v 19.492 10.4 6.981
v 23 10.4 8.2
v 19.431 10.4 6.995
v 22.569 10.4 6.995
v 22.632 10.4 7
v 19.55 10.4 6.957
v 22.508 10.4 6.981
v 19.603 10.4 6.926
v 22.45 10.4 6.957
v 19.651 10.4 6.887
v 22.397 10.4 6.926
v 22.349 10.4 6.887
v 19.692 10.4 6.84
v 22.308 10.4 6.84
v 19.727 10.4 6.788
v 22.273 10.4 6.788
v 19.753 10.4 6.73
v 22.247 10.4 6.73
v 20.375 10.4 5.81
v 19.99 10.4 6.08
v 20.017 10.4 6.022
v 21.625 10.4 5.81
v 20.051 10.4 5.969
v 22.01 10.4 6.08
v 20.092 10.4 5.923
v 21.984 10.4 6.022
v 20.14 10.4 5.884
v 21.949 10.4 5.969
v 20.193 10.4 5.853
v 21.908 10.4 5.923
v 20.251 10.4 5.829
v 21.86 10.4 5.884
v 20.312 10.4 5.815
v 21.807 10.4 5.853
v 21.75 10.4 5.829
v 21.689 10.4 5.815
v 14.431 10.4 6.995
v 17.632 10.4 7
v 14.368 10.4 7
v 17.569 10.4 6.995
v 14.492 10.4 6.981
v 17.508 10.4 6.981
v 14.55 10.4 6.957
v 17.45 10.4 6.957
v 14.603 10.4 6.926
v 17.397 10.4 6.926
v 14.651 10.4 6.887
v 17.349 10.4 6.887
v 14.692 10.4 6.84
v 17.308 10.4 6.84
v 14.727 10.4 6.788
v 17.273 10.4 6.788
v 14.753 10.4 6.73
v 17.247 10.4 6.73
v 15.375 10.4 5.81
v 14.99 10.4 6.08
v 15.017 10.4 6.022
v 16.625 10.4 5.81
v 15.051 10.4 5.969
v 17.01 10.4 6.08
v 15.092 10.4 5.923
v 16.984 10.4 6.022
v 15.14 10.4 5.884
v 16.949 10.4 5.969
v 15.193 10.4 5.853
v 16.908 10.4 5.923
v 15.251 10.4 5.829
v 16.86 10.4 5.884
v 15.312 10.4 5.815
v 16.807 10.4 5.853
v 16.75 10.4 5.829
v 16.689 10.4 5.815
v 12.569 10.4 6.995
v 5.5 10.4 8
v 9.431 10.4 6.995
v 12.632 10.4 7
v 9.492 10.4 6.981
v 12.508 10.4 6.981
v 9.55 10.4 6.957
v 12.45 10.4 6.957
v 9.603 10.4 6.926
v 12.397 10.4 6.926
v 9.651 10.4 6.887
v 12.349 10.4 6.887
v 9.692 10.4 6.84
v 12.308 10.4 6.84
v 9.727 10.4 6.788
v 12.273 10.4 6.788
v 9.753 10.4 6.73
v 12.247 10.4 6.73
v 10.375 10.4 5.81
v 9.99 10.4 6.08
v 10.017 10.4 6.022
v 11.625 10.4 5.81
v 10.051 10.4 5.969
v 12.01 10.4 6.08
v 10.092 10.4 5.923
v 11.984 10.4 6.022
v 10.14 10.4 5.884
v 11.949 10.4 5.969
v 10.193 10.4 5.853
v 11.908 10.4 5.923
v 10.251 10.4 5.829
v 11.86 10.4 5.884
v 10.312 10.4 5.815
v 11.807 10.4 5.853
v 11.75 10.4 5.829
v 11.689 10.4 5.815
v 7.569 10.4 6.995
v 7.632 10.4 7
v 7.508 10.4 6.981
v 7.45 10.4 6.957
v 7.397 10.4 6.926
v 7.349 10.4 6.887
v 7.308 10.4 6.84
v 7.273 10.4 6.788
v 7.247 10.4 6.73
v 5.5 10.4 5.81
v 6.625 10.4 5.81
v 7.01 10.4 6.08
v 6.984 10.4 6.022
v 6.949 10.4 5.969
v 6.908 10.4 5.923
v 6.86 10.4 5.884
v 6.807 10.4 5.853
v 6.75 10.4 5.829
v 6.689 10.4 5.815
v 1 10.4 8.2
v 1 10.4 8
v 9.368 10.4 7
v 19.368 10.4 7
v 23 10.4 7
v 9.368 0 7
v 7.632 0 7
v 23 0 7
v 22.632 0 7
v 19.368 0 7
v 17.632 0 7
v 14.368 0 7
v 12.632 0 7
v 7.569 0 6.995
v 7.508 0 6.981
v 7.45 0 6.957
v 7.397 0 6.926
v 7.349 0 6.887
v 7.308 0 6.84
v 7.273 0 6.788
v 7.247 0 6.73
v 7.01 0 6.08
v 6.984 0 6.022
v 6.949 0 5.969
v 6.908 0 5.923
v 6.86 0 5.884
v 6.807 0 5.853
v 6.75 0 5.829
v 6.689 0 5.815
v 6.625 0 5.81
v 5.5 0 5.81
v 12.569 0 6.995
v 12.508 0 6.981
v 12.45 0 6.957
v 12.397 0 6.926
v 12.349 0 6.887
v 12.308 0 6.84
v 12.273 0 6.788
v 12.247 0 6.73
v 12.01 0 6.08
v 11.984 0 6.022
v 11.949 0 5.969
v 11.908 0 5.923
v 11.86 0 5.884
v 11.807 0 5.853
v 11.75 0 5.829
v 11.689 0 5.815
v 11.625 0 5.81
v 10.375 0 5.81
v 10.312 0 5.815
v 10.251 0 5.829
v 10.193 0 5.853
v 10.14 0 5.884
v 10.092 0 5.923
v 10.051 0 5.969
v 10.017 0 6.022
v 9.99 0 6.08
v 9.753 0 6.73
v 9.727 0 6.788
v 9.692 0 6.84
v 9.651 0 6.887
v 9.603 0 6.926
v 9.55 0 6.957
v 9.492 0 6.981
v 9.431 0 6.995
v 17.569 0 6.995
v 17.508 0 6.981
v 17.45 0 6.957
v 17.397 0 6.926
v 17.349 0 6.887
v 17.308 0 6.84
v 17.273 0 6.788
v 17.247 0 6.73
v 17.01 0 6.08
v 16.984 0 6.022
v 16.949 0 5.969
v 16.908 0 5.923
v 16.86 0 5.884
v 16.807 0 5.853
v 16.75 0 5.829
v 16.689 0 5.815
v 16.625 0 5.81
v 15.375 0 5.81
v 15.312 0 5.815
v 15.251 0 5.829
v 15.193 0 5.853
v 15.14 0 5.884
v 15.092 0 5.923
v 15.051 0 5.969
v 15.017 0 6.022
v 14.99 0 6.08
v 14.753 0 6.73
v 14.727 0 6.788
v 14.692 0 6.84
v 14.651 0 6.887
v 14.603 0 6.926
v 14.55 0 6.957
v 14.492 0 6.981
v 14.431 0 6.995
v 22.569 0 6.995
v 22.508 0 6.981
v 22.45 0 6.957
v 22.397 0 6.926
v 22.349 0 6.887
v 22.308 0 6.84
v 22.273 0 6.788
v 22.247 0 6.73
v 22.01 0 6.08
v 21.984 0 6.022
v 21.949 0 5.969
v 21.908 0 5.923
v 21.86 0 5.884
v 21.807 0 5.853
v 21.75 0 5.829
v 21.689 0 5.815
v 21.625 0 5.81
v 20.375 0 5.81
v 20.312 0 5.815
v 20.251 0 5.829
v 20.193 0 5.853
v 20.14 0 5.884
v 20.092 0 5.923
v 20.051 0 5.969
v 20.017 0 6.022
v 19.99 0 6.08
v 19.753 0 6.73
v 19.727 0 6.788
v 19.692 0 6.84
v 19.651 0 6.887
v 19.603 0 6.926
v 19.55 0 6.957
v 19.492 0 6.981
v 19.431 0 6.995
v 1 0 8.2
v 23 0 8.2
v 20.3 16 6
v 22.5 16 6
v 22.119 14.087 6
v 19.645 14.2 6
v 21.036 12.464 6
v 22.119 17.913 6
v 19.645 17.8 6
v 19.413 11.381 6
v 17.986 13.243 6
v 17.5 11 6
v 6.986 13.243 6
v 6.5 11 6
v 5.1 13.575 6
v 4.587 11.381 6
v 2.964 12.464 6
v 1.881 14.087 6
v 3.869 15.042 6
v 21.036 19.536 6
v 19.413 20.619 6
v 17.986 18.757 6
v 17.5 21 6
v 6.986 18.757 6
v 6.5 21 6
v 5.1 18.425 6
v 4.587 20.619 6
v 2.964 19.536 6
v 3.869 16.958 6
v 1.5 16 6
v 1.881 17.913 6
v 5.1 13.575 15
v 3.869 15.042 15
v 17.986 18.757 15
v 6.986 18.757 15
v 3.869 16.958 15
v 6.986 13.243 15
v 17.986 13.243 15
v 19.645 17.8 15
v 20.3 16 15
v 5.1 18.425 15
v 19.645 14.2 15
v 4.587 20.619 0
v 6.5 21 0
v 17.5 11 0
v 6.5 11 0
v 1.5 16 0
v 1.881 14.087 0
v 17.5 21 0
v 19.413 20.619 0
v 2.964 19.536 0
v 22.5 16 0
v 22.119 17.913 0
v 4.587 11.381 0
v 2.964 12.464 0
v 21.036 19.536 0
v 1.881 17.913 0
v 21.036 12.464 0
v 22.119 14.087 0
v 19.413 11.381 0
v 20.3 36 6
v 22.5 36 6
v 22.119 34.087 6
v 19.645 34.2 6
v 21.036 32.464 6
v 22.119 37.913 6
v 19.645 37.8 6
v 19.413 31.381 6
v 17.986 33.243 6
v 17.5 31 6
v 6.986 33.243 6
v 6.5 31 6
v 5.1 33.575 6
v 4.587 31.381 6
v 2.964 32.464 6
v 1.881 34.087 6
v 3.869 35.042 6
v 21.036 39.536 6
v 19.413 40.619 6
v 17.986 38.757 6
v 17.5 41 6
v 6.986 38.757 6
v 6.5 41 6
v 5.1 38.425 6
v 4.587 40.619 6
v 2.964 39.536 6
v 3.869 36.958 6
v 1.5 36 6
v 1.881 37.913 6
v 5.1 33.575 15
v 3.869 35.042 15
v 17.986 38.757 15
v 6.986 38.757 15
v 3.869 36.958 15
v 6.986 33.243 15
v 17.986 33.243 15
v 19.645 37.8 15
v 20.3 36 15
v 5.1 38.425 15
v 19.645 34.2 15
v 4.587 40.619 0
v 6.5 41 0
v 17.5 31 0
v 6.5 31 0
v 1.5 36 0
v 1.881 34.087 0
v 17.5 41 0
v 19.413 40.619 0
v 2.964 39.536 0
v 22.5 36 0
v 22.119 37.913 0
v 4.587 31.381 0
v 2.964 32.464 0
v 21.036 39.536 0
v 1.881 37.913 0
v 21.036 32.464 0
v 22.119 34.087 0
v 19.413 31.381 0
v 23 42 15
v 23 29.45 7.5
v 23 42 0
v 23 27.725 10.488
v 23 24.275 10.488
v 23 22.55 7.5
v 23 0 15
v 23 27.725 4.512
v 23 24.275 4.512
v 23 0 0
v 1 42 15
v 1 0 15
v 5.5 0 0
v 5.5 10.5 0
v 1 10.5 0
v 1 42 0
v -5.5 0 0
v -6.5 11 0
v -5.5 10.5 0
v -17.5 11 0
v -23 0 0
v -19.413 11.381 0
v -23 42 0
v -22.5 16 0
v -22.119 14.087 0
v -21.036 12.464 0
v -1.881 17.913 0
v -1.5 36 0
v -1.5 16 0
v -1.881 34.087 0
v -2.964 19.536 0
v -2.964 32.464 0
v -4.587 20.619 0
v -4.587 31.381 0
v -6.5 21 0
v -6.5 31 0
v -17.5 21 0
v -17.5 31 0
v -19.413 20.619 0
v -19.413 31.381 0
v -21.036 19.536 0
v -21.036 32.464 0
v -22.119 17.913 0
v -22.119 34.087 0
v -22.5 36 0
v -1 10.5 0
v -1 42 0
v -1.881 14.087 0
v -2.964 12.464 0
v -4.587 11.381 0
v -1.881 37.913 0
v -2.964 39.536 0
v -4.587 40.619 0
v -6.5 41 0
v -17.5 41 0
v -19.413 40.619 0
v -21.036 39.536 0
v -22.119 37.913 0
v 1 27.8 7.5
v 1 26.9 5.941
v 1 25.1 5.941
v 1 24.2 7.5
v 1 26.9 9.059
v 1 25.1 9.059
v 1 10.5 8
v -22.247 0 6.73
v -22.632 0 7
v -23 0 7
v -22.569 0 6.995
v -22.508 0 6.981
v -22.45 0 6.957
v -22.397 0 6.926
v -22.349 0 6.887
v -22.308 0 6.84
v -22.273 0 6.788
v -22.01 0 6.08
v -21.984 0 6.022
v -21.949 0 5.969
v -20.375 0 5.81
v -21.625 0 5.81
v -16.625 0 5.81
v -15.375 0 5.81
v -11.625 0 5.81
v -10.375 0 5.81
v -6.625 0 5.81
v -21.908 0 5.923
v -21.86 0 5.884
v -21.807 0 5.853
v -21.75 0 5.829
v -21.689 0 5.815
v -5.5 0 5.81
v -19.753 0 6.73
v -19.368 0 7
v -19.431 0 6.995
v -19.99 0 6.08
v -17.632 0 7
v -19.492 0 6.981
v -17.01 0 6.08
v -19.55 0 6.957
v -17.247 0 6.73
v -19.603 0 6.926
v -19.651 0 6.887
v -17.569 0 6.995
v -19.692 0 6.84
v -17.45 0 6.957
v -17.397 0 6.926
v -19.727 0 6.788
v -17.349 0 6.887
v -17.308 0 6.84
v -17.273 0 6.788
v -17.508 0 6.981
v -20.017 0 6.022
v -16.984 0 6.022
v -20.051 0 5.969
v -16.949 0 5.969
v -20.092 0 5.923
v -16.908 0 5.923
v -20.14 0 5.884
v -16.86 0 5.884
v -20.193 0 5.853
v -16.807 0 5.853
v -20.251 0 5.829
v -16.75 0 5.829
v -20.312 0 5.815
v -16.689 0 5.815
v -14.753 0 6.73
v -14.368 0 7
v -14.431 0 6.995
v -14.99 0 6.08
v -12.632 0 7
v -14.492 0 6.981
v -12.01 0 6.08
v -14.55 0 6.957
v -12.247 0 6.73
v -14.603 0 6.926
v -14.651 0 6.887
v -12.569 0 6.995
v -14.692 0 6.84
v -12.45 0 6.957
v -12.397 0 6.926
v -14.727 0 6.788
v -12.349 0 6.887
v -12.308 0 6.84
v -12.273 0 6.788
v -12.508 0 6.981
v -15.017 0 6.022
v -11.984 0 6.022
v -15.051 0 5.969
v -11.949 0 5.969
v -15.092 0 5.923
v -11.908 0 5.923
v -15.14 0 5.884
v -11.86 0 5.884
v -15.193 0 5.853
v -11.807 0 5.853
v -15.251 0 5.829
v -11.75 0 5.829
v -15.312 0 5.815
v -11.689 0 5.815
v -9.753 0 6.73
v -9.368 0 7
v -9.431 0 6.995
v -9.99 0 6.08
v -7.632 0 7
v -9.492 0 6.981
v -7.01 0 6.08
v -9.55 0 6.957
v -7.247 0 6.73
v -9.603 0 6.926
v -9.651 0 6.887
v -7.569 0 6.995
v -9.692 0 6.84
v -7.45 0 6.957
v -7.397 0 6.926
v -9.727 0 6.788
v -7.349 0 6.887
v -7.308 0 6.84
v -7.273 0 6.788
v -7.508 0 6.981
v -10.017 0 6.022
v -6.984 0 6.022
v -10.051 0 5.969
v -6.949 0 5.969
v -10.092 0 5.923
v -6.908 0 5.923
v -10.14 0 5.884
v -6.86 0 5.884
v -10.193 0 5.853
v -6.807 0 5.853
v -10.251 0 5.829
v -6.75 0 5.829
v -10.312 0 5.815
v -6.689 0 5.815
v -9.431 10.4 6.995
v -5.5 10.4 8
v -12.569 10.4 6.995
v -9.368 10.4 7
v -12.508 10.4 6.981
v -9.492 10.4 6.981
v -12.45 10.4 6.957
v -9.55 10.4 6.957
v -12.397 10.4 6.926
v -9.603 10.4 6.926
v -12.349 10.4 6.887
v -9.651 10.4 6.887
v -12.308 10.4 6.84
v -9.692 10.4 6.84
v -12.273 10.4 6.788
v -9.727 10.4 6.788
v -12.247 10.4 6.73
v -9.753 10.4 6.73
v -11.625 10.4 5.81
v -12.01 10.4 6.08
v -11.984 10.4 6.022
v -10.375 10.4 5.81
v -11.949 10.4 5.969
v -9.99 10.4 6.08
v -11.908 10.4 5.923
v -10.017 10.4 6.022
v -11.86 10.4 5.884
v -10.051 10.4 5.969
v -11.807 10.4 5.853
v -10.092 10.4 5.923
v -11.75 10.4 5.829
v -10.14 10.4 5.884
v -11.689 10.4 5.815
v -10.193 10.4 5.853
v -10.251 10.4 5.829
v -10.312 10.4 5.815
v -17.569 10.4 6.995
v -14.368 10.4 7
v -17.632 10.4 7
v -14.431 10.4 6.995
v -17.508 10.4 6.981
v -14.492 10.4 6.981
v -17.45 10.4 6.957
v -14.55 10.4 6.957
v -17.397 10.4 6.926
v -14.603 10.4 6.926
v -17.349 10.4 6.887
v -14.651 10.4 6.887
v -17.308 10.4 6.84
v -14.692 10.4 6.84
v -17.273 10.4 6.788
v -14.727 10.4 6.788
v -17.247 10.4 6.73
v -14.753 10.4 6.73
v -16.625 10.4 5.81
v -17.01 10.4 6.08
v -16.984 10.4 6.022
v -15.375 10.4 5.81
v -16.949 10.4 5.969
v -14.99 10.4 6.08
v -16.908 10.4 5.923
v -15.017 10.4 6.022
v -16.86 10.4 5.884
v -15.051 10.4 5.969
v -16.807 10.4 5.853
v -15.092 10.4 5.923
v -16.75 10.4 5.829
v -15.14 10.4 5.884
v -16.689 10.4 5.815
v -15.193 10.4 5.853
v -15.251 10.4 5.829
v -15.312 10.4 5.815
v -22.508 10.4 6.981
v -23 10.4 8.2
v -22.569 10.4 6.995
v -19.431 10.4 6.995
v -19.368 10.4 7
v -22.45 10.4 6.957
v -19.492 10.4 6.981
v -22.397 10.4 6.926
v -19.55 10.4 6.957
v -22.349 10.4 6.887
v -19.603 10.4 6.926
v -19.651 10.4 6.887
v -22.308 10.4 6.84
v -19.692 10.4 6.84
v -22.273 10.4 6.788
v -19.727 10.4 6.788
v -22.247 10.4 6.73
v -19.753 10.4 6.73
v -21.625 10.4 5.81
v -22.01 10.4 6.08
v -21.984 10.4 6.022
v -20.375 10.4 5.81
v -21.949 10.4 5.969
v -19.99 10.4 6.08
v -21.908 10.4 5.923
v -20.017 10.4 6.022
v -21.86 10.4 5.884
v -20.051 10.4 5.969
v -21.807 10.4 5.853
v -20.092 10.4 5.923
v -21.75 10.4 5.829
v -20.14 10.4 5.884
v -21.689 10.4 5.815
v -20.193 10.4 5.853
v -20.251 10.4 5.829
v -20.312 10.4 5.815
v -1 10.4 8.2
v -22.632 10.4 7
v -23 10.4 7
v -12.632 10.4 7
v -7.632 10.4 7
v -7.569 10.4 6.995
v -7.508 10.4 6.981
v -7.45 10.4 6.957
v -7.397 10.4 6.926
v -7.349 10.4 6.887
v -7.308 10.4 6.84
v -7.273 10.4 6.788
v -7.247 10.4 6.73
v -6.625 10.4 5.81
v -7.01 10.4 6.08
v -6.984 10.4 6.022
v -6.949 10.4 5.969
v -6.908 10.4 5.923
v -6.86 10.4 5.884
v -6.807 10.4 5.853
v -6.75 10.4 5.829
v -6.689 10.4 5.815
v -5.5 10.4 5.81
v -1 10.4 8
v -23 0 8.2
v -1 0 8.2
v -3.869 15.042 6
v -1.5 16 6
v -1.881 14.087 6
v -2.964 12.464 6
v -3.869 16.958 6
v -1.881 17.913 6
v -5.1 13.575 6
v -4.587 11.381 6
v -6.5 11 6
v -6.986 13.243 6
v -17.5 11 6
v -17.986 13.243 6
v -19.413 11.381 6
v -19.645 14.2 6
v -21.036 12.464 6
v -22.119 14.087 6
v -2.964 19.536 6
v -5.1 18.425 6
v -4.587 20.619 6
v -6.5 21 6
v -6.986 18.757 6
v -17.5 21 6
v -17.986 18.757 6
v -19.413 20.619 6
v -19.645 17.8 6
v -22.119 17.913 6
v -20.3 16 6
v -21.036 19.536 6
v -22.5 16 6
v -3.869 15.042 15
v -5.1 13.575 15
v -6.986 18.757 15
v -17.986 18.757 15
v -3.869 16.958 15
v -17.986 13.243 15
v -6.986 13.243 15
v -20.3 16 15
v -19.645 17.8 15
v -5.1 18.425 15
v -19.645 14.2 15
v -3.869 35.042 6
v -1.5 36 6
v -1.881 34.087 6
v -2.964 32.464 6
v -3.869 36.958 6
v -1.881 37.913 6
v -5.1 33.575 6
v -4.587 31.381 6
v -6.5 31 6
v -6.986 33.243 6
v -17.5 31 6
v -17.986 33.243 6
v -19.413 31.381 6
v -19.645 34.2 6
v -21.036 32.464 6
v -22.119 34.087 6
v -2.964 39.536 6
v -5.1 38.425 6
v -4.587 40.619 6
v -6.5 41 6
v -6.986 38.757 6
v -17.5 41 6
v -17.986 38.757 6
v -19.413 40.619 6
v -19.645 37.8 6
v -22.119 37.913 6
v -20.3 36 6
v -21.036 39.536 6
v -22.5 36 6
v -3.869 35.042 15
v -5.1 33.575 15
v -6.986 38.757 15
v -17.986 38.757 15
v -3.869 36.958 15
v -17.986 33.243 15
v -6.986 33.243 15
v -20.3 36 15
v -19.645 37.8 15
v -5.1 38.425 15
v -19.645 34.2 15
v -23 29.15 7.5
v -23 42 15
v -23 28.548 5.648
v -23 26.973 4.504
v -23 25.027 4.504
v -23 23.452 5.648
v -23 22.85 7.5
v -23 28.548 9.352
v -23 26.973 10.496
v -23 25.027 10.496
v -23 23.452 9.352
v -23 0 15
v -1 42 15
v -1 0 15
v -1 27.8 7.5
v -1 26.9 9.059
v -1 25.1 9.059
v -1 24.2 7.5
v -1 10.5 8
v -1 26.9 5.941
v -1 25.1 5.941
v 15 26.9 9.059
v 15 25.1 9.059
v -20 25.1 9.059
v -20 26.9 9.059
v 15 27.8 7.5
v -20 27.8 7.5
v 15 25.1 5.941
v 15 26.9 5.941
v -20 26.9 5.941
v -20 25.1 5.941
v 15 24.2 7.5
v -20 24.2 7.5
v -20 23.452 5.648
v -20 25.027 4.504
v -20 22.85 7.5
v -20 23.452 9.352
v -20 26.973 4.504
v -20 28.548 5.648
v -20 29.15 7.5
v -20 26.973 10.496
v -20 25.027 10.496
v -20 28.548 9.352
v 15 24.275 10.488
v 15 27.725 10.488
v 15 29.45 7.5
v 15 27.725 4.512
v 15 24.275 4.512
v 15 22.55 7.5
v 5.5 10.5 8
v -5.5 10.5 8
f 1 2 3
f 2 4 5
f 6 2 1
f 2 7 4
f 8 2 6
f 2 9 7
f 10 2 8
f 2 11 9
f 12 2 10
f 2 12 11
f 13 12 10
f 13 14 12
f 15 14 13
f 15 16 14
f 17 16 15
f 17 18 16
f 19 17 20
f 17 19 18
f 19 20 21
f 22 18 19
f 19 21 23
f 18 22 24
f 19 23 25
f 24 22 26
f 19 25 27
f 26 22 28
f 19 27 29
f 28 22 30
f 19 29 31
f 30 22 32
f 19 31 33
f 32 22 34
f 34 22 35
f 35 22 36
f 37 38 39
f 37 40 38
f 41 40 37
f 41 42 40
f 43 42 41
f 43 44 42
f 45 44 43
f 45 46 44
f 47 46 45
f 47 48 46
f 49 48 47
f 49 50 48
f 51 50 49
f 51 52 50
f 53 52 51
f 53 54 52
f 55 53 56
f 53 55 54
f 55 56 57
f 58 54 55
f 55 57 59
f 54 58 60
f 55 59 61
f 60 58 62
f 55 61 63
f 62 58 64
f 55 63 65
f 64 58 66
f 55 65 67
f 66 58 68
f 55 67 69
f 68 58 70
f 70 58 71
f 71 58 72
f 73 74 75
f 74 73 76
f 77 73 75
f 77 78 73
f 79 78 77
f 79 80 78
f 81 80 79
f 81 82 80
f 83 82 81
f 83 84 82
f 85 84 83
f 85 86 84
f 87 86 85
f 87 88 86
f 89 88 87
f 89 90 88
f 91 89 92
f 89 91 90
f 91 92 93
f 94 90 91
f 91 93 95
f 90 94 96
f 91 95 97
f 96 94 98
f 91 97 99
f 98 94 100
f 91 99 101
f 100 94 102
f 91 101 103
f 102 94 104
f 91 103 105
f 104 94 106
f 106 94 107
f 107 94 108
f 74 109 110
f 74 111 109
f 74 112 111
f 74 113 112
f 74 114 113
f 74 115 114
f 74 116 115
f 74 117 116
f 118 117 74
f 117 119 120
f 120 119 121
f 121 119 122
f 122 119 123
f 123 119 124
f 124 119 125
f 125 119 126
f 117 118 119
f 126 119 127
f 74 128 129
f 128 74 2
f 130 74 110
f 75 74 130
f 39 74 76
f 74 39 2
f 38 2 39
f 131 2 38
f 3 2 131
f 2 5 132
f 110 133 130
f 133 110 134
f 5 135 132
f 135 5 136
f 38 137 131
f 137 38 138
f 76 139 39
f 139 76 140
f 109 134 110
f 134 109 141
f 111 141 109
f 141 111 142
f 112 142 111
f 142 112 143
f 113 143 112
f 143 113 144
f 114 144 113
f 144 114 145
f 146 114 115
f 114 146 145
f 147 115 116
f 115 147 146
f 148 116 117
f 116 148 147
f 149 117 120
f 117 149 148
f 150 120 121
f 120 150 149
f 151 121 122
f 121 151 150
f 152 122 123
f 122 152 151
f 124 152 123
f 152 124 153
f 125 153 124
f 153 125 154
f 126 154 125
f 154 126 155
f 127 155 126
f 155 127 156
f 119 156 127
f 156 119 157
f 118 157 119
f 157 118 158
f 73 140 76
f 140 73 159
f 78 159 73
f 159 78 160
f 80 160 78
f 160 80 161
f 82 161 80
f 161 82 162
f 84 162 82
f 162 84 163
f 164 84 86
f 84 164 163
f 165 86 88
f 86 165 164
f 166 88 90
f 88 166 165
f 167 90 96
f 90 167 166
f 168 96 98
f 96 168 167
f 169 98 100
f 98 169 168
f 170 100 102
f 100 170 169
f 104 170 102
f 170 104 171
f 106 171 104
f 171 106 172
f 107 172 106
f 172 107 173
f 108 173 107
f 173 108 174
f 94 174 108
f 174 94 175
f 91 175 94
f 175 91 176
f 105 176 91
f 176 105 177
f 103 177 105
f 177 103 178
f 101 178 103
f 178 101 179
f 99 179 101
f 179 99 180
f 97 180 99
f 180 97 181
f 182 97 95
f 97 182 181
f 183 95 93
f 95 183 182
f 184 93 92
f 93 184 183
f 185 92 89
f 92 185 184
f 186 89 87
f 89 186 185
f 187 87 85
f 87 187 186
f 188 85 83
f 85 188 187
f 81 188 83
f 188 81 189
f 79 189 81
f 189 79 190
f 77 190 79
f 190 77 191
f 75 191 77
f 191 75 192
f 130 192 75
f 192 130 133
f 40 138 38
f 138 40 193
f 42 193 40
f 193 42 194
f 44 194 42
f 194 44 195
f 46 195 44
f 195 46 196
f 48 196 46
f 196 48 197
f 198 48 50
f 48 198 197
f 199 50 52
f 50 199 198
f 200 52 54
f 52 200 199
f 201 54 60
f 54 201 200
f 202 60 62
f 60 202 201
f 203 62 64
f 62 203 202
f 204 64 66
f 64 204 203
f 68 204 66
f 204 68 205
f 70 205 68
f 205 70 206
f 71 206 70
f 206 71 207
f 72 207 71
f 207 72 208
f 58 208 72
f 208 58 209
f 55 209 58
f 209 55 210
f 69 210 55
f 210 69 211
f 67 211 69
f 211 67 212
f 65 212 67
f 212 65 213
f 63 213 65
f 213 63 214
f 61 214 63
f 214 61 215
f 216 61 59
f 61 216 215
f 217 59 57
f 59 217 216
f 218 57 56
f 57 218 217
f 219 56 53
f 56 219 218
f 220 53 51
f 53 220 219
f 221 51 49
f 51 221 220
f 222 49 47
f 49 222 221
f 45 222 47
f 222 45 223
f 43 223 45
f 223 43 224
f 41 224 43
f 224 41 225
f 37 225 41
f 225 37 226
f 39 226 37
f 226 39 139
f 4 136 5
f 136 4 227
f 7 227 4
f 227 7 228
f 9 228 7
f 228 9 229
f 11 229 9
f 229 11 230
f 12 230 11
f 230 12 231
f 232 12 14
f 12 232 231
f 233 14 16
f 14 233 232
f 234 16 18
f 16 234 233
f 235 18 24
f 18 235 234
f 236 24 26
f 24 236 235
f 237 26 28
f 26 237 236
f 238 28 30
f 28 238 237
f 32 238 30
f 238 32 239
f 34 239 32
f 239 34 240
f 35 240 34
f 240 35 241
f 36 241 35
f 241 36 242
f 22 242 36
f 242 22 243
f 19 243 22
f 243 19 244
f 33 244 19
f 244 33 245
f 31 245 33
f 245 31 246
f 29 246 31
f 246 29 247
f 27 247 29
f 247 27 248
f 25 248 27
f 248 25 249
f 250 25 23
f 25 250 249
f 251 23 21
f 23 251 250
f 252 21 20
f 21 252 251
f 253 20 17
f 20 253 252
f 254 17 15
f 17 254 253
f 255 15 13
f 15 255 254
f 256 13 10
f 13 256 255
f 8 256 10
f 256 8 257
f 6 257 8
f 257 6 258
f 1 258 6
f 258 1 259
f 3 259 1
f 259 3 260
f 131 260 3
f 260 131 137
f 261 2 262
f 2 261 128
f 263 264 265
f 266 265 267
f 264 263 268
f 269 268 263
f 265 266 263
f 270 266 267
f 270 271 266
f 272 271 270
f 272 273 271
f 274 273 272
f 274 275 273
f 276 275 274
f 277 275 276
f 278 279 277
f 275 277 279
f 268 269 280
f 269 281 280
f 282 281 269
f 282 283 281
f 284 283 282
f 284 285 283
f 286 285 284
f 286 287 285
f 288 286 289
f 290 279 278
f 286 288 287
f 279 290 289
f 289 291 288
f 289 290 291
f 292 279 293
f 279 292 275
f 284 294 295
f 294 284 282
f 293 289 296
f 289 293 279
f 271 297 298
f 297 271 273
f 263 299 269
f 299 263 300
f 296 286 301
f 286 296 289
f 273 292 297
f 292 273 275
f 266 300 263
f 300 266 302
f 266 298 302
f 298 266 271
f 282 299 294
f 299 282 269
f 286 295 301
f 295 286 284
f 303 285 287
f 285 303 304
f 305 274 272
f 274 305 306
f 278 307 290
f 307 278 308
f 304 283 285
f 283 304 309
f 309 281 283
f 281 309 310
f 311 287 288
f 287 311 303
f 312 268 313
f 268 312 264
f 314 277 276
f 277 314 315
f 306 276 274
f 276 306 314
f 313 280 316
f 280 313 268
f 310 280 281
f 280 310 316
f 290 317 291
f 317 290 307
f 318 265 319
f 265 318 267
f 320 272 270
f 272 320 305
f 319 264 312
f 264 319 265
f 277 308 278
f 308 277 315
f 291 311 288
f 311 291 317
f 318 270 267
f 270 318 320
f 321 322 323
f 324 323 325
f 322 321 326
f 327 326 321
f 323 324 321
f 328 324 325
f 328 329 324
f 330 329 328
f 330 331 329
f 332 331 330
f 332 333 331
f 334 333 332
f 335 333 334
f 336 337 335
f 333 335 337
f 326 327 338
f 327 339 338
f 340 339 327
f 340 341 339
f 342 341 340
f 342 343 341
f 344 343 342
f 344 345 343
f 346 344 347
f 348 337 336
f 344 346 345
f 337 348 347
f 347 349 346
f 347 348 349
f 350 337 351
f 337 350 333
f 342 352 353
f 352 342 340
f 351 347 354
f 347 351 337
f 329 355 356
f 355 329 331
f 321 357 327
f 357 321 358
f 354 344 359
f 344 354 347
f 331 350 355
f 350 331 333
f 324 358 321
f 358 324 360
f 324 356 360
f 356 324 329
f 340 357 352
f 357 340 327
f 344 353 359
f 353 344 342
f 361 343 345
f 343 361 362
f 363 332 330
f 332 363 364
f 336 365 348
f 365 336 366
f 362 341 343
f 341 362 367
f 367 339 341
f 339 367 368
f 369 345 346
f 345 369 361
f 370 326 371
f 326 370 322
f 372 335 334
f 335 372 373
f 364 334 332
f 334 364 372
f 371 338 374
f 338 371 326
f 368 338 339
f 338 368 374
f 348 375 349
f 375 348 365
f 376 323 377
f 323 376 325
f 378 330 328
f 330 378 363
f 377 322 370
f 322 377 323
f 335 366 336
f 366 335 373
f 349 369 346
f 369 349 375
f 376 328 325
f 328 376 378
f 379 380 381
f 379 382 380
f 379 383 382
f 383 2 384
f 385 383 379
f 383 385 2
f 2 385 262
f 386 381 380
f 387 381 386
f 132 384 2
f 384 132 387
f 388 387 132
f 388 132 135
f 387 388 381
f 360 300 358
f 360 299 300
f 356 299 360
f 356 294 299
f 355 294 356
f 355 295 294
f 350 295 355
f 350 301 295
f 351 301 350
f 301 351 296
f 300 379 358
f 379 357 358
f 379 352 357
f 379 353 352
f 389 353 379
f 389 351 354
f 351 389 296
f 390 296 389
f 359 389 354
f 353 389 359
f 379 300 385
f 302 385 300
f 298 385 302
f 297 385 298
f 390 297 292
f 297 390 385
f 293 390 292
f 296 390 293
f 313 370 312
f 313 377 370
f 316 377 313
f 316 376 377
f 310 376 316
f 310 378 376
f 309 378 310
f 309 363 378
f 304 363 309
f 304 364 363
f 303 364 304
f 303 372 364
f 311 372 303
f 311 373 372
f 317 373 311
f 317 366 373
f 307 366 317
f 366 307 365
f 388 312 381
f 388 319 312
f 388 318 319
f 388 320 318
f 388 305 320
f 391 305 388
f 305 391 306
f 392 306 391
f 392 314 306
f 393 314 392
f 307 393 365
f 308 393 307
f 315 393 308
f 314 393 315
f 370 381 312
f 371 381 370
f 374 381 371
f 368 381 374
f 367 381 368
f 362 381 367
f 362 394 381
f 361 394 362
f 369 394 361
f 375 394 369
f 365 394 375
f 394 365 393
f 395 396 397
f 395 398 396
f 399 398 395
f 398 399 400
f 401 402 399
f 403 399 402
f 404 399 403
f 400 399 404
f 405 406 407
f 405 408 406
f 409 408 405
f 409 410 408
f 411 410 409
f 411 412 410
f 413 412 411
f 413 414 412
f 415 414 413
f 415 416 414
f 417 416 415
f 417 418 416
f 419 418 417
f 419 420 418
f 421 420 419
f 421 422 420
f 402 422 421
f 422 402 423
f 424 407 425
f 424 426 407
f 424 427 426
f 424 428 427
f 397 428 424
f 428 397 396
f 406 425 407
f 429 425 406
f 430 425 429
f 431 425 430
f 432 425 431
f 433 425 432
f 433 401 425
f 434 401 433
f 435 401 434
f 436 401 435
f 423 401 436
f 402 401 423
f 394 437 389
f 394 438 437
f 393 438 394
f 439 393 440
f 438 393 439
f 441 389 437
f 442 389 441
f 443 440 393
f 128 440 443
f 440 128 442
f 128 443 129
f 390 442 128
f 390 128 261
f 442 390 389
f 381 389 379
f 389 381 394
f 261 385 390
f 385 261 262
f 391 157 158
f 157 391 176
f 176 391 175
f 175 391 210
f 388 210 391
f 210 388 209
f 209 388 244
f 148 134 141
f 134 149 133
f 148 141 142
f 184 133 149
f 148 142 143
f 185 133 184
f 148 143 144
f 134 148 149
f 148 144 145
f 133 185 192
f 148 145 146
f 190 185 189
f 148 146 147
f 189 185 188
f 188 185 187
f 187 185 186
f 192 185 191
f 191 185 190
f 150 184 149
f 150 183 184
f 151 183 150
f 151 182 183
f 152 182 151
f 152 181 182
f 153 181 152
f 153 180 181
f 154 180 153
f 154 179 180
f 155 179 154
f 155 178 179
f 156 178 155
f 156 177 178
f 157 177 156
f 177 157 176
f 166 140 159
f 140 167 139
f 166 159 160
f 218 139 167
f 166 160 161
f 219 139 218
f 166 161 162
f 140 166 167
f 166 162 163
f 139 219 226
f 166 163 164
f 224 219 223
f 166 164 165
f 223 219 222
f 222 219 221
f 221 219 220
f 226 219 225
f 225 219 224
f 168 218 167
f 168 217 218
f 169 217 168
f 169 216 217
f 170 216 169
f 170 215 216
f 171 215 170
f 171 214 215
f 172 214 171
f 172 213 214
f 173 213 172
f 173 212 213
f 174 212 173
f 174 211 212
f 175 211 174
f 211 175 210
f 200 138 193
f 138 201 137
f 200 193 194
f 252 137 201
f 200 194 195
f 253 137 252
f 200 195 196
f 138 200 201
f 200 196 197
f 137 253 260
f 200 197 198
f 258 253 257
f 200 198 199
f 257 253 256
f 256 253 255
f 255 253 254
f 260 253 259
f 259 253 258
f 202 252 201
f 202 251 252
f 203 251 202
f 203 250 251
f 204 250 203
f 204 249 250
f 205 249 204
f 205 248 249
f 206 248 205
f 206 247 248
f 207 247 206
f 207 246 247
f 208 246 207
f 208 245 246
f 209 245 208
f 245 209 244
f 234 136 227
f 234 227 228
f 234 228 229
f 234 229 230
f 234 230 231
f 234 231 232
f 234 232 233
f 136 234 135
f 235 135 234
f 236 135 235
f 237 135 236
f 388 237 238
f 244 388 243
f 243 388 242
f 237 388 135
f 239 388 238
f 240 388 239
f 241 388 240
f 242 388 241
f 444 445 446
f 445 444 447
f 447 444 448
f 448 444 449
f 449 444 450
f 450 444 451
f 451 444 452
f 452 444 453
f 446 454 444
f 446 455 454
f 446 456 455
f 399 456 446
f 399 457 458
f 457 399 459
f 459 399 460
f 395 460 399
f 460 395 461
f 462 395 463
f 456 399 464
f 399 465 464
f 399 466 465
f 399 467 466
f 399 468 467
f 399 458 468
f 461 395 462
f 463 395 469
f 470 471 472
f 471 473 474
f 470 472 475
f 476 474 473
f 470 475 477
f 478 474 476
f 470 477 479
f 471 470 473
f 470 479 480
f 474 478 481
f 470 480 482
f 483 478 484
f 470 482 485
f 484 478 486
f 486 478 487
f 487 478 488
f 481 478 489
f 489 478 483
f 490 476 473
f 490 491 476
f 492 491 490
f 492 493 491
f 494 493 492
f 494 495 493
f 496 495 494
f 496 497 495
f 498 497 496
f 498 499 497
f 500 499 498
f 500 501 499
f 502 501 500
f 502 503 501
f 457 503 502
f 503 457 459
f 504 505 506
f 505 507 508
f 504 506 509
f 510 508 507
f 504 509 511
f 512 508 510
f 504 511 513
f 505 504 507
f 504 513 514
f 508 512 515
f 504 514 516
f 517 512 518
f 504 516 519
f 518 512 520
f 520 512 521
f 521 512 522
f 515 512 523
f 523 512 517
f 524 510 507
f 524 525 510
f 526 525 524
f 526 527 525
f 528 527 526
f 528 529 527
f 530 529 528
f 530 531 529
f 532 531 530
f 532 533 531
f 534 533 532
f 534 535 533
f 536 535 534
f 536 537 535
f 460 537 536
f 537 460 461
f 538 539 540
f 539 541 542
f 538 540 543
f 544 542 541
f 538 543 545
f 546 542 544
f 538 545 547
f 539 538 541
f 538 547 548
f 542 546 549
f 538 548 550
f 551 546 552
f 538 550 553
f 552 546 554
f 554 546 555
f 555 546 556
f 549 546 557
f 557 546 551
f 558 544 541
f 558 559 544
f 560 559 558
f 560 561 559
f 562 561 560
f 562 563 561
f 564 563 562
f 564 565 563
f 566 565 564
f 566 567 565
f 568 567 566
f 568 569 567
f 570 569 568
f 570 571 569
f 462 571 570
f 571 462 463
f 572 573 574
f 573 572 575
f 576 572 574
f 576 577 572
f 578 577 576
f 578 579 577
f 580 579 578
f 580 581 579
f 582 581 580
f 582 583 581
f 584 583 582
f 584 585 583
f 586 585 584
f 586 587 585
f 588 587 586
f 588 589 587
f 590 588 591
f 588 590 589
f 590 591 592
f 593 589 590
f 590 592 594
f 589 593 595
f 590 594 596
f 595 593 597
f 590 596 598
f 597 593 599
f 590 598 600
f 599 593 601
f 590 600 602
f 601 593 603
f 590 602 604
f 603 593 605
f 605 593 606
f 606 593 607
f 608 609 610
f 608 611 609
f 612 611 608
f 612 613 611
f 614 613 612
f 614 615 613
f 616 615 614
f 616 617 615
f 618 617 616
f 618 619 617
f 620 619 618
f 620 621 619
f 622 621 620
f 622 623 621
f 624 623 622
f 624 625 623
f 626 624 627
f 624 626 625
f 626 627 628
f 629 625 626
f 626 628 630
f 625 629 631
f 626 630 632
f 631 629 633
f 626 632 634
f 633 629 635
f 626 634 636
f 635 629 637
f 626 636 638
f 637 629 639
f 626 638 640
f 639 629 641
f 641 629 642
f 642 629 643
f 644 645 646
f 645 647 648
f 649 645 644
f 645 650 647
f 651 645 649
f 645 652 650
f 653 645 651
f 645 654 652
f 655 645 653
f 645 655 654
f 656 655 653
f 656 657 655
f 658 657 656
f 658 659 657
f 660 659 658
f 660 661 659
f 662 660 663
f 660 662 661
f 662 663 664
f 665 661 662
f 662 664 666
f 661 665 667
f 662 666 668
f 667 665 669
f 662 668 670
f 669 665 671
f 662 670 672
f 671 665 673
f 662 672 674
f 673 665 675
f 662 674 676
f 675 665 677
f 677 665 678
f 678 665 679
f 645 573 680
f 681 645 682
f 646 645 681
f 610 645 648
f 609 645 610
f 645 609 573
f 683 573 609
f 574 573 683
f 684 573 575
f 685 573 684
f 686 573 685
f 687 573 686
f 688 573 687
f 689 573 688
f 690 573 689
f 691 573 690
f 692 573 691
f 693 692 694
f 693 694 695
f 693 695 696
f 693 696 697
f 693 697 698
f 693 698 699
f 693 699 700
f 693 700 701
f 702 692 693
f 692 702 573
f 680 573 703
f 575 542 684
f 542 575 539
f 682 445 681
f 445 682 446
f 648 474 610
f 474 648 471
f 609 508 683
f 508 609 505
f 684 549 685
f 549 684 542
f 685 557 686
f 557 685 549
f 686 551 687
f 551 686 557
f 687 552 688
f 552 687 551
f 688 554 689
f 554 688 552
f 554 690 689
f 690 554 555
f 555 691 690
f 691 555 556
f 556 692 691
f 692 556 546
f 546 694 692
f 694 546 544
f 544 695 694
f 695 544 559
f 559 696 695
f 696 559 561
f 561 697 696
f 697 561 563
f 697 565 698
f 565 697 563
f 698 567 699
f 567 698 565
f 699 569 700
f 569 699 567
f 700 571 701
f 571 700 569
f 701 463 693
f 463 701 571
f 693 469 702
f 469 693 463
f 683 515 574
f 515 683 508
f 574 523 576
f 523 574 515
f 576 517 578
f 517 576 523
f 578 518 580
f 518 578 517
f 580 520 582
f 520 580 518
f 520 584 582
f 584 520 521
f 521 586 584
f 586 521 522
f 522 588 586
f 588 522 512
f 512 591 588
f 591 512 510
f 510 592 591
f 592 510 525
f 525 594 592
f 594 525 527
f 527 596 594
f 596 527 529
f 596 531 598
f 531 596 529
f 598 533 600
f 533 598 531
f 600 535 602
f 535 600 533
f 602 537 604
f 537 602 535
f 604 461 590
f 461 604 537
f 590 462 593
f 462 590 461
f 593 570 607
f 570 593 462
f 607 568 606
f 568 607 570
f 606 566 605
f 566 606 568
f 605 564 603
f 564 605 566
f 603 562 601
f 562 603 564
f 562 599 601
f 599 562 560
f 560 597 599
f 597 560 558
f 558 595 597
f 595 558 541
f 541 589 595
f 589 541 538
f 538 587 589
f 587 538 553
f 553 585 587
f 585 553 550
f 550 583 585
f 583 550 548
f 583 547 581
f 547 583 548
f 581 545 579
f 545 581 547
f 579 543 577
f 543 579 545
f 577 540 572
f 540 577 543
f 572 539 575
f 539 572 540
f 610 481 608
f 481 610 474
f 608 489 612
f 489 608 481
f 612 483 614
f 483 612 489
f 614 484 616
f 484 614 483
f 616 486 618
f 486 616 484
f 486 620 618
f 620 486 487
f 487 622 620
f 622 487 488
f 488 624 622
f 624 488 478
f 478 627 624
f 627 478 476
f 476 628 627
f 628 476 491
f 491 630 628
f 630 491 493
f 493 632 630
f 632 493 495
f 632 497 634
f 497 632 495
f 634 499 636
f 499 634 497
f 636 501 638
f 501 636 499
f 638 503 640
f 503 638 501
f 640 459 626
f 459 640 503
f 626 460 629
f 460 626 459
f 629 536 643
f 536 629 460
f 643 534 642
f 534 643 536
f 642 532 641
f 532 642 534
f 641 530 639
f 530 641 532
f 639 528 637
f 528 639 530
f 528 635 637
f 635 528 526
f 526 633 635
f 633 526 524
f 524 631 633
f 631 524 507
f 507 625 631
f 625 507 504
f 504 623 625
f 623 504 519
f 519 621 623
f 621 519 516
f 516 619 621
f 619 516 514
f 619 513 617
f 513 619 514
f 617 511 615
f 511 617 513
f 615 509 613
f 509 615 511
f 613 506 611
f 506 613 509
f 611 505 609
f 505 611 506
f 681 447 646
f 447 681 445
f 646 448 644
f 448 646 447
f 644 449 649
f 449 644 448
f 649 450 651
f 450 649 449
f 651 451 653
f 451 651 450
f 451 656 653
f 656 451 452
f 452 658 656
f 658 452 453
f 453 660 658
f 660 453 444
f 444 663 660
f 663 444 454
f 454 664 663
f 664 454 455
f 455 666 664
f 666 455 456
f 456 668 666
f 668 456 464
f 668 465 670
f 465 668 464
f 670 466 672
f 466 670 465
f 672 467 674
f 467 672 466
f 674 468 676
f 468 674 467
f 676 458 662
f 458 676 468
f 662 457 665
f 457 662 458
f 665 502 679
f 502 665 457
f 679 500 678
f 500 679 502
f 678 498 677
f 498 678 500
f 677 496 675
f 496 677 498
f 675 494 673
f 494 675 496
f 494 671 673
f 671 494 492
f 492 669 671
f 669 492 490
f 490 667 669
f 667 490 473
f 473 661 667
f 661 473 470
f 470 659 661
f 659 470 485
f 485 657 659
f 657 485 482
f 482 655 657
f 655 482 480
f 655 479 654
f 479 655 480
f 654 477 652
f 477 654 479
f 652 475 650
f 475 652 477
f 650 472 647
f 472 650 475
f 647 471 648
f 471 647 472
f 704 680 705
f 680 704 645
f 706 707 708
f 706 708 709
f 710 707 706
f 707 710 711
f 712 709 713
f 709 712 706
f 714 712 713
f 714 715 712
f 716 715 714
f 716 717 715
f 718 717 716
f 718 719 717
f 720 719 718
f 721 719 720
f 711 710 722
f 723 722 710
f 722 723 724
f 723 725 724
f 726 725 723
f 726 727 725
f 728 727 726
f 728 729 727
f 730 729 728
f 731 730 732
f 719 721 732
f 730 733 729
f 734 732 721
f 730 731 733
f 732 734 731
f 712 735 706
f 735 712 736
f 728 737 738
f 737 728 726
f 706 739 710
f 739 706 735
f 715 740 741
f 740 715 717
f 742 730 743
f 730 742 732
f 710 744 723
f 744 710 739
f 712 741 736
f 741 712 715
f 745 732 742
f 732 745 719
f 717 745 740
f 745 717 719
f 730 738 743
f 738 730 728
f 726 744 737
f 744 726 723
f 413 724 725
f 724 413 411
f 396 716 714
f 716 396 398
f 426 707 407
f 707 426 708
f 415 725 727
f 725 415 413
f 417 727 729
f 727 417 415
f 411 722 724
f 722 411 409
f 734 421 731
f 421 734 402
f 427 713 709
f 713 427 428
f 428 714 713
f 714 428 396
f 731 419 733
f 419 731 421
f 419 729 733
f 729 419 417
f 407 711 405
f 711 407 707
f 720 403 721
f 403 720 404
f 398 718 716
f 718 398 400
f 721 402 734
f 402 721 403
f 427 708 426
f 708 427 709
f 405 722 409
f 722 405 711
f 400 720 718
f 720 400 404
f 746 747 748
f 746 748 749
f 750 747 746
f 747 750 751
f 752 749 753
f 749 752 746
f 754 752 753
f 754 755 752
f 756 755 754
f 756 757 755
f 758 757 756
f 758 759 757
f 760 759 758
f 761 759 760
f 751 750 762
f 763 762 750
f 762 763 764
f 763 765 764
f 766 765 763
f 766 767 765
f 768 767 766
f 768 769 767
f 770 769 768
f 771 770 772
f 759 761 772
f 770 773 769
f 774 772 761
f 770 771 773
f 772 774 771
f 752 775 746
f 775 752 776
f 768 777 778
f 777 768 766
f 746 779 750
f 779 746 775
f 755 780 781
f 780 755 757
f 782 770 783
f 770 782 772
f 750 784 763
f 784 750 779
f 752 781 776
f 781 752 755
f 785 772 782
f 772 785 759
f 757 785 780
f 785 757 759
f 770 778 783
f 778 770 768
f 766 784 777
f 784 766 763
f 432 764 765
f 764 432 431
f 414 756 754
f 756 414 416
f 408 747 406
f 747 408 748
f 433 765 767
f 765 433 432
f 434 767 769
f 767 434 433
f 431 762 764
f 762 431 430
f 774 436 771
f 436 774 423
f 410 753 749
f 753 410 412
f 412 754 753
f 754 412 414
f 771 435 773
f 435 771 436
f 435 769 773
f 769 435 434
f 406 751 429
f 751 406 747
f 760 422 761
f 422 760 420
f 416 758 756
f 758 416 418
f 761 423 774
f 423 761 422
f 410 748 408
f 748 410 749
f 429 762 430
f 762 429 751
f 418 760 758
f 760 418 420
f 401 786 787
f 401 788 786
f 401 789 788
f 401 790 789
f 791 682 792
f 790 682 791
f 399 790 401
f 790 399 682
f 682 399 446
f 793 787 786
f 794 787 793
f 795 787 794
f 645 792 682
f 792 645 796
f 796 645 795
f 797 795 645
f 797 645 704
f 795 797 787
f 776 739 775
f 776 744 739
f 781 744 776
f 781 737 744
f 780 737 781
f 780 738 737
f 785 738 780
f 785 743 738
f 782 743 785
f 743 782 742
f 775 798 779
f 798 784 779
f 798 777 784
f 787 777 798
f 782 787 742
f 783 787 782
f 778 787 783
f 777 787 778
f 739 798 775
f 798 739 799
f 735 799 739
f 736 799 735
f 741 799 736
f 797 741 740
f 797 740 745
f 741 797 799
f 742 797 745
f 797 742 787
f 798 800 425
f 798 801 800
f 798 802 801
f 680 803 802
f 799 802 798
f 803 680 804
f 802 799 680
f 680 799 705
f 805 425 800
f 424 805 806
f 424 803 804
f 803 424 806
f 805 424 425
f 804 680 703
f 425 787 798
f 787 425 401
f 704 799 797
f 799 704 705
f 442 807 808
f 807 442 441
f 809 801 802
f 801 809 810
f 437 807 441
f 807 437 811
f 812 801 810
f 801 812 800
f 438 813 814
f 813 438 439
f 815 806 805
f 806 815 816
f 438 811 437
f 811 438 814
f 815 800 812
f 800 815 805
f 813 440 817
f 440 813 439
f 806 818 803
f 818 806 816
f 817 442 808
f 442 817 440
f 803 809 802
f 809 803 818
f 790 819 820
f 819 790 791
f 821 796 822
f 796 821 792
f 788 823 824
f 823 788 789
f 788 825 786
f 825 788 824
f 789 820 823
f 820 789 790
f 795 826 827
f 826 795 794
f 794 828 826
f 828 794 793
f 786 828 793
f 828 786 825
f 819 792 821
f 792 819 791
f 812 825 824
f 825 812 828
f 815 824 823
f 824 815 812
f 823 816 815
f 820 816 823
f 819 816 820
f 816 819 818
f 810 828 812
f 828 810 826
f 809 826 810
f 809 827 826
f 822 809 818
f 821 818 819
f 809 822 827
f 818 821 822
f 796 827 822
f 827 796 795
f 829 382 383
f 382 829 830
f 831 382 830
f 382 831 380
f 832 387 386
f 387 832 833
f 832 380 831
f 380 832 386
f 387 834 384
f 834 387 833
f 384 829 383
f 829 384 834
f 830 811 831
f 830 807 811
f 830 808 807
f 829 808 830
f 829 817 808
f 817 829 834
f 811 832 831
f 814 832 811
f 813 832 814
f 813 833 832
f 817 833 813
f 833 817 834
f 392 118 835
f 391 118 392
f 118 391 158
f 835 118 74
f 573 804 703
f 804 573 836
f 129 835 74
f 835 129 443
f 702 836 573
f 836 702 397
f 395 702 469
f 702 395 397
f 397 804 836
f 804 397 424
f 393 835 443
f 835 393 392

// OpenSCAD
/*Parametric belting section generator 
By - The DoomMeister
Derived from http://www.thingiverse.com/thing:16627 by Droftarts
*/


//Variables
tooth_profile = "T5"; // "T2.5", "T5" , "T10"
belt_width = 10.5;
n = 20;

//Draw
//belt_length(profile = tooth_profile, belt_width = 10, n = 30);$
difference() {
	bodyTwo();
	translate([25,26,7.5])rotate([-90,0,90])m3Screw(45);	
	#translate([-5.5,0,0])cube([11,10.5,8]);
}

module bodyTwo() {
	body();
	mirror([1,0,0]){
		body();
	}
}

module body() {
	translate([1,0,0])difference(){
		cube([22,42,15]);
//	translate([5,0,8])cube([20,7,3.6]);
		#color("red")translate([0,-0.1,7])rotate([-90,0,0])belt_length(profile = "T5", belt_width = belt_width, n = 8);
		#color("red")translate([0,-0.1,7.2])rotate([-90,0,0])belt_length(profile = "T5", belt_width = belt_width, n = 8);
//	#rotate([-90,0,90])m3Screw();
//	translate([20,26,7.5])rotate([-90,0,90])m3Screw(40);
		#translate([5.5,16,16])m5ScrewSlot();
		#translate([5.5,36,16])m5ScrewSlot();
	}
}
//translate([-23,0,0])mirror([0,0,0])difference(){
//	cube([22,45,15]);
////	translate([5,0,8])cube([20,7,3.6]);
//	#color("red")translate([0,0,7])rotate([-90,0,0])belt_length(profile = "T5", belt_width = belt_width, n = 8);
//	#color("red")translate([0,0,7.2])rotate([-90,0,0])belt_length(profile = "T5", belt_width = belt_width, n = 8);
////	translate([40,26,7.5])rotate([-90,0,90])m3Screw(40);
////	translate([40,13,7.50])m5Screw();
//	#translate([10,16,16])m5ScrewSlot();
//	#translate([10,36,16])m5ScrewSlot();
////	#translate([10,36,0])m5Screw();
//}


module m3Screw(h=15) {
	union() {
		#translate([0,0,0])cylinder(h=h+5,r=3.6/2);
//		cylinder(h=5,r=3.6/2);
		#translate([0,0,h])cylinder(h=5.5,r=6.3/2);
		#translate([0,0,0])cylinder(h=10,r=6.9/2,$fn=6);
	}
}

module m5ScrewSlot(h=10, length=11) {
	rotate([180,0,0])union() {
		hull(){
			cylinder(h=h,r=2.8);
			translate([length,0,0])cylinder(h=h,r=2.8);
		}
		hull(){
			translate([0,0,h])cylinder(h=20,r=5);
			translate([length,0,h])cylinder(h=20,r=5);
		}
	}
}
module m5Screw(h=10) {
	union() {
		cylinder(h=h,r=2.8);
		translate([0,0,h])cylinder(h=20,r=5);
	}
}




























//translate([0,0,-40])color("green")belt_length(profile = "T10", belt_width = 10, n = 8);
//Outer Module
module belt_length(profile = "T2.5", belt_width = 6, n = 10)
{

			if ( profile == "T2.5" ) 
				{ 
					_belt_length(
						profile=profile, 
						n = n, 
						belt_width = belt_width,
						tooth_pitch = 2.5,
						backing_thickness = 0.6	
						);
				}
			if ( profile == "T5" ) 
				{ 
					_belt_length(
						profile=profile, 
						n = n, 
						belt_width = belt_width,
						tooth_pitch = 5,
						backing_thickness = 1	
						);
				}
			if ( profile == "T10" ) 
				{ 
					_belt_length(
						profile=profile, 
						n = n, 
						belt_width = belt_width,
						tooth_pitch = 10,
						backing_thickness = 2
						);
				}
			if ( profile == "MXL" ) 
				{ 
					_belt_length(
						profile=profile, 
						n = n, 
						belt_width = belt_width,
						tooth_pitch = 2.032,
						backing_thickness = 0.64
						);
				}


}



//inner module
module _belt_length(profile = "T2.5", n = 10, belt_width = 5, tooth_pitch = 2.5, backing_thickness = 0.6)
{

for( i = [0:n])
	{
		union(){

			if ( profile == "T2.5" ) { translate([tooth_pitch*i,0,0])T2_5(width = belt_width);}
			if ( profile == "T5" ) { translate([tooth_pitch*i,0,0])T5(width = belt_width);}
			if ( profile == "T10" ) { translate([tooth_pitch*i,0,0])T10(width = belt_width);}
			if ( profile == "MXL" ) { translate([tooth_pitch*i,0,0])MXL(width = belt_width);}
			translate([(tooth_pitch*i)-(tooth_pitch/2),-backing_thickness,0])cube([tooth_pitch,backing_thickness,belt_width]);
		}
	}
}



//Tooth Form modules - Taken from http://www.thingiverse.com/thing:1662
module T2_5(width = 2)
	{
	linear_extrude(height=width) polygon([[-0.839258,-0.5],[-0.839258,0],[-0.770246,0.021652],[-0.726369,0.079022],[-0.529167,0.620889],[-0.485025,0.67826],[-0.416278,0.699911],[0.416278,0.699911],[0.484849,0.67826],[0.528814,0.620889],[0.726369,0.079022],[0.770114,0.021652],[0.839258,0],[0.839258,-0.5]]);
	}

module T5(width = 2)
	{
	linear_extrude(height=width) polygon([[-1.632126,-0.5],[-1.632126,0],[-1.568549,0.004939],[-1.507539,0.019367],[-1.450023,0.042686],[-1.396912,0.074224],[-1.349125,0.113379],[-1.307581,0.159508],[-1.273186,0.211991],[-1.246868,0.270192],[-1.009802,0.920362],[-0.983414,0.978433],[-0.949018,1.030788],[-0.907524,1.076798],[-0.859829,1.115847],[-0.80682,1.147314],[-0.749402,1.170562],[-0.688471,1.184956],[-0.624921,1.189895],[0.624971,1.189895],[0.688622,1.184956],[0.749607,1.170562],[0.807043,1.147314],[0.860055,1.115847],[0.907754,1.076798],[0.949269,1.030788],[0.9837,0.978433],[1.010193,0.920362],[1.246907,0.270192],[1.273295,0.211991],[1.307726,0.159508],[1.349276,0.113379],[1.397039,0.074224],[1.450111,0.042686],[1.507589,0.019367],[1.568563,0.004939],[1.632126,0],[1.632126,-0.5]]);
	}

module T10(width = 2)
	{
	linear_extrude(height=width) polygon([[-3.06511,-1],[-3.06511,0],[-2.971998,0.007239],[-2.882718,0.028344],[-2.79859,0.062396],[-2.720931,0.108479],[-2.651061,0.165675],[-2.590298,0.233065],[-2.539962,0.309732],[-2.501371,0.394759],[-1.879071,2.105025],[-1.840363,2.190052],[-1.789939,2.266719],[-1.729114,2.334109],[-1.659202,2.391304],[-1.581518,2.437387],[-1.497376,2.47144],[-1.408092,2.492545],[-1.314979,2.499784],[1.314979,2.499784],[1.408091,2.492545],[1.497371,2.47144],[1.581499,2.437387],[1.659158,2.391304],[1.729028,2.334109],[1.789791,2.266719],[1.840127,2.190052],[1.878718,2.105025],[2.501018,0.394759],[2.539726,0.309732],[2.59015,0.233065],[2.650975,0.165675],[2.720887,0.108479],[2.798571,0.062396],[2.882713,0.028344],[2.971997,0.007239],[3.06511,0],[3.06511,-1]]);
	}

module MXL(width = 2)
	{
	linear_extrude(height=width) polygon([[-0.660421,-0.5],[-0.660421,0],[-0.621898,0.006033],[-0.587714,0.023037],[-0.560056,0.049424],[-0.541182,0.083609],[-0.417357,0.424392],[-0.398413,0.458752],[-0.370649,0.48514],[-0.336324,0.502074],[-0.297744,0.508035],[0.297744,0.508035],[0.336268,0.502074],[0.370452,0.48514],[0.39811,0.458752],[0.416983,0.424392],[0.540808,0.083609],[0.559752,0.049424],[0.587516,0.023037],[0.621841,0.006033],[0.660421,0],[0.660421,-0.5]]);
	}
